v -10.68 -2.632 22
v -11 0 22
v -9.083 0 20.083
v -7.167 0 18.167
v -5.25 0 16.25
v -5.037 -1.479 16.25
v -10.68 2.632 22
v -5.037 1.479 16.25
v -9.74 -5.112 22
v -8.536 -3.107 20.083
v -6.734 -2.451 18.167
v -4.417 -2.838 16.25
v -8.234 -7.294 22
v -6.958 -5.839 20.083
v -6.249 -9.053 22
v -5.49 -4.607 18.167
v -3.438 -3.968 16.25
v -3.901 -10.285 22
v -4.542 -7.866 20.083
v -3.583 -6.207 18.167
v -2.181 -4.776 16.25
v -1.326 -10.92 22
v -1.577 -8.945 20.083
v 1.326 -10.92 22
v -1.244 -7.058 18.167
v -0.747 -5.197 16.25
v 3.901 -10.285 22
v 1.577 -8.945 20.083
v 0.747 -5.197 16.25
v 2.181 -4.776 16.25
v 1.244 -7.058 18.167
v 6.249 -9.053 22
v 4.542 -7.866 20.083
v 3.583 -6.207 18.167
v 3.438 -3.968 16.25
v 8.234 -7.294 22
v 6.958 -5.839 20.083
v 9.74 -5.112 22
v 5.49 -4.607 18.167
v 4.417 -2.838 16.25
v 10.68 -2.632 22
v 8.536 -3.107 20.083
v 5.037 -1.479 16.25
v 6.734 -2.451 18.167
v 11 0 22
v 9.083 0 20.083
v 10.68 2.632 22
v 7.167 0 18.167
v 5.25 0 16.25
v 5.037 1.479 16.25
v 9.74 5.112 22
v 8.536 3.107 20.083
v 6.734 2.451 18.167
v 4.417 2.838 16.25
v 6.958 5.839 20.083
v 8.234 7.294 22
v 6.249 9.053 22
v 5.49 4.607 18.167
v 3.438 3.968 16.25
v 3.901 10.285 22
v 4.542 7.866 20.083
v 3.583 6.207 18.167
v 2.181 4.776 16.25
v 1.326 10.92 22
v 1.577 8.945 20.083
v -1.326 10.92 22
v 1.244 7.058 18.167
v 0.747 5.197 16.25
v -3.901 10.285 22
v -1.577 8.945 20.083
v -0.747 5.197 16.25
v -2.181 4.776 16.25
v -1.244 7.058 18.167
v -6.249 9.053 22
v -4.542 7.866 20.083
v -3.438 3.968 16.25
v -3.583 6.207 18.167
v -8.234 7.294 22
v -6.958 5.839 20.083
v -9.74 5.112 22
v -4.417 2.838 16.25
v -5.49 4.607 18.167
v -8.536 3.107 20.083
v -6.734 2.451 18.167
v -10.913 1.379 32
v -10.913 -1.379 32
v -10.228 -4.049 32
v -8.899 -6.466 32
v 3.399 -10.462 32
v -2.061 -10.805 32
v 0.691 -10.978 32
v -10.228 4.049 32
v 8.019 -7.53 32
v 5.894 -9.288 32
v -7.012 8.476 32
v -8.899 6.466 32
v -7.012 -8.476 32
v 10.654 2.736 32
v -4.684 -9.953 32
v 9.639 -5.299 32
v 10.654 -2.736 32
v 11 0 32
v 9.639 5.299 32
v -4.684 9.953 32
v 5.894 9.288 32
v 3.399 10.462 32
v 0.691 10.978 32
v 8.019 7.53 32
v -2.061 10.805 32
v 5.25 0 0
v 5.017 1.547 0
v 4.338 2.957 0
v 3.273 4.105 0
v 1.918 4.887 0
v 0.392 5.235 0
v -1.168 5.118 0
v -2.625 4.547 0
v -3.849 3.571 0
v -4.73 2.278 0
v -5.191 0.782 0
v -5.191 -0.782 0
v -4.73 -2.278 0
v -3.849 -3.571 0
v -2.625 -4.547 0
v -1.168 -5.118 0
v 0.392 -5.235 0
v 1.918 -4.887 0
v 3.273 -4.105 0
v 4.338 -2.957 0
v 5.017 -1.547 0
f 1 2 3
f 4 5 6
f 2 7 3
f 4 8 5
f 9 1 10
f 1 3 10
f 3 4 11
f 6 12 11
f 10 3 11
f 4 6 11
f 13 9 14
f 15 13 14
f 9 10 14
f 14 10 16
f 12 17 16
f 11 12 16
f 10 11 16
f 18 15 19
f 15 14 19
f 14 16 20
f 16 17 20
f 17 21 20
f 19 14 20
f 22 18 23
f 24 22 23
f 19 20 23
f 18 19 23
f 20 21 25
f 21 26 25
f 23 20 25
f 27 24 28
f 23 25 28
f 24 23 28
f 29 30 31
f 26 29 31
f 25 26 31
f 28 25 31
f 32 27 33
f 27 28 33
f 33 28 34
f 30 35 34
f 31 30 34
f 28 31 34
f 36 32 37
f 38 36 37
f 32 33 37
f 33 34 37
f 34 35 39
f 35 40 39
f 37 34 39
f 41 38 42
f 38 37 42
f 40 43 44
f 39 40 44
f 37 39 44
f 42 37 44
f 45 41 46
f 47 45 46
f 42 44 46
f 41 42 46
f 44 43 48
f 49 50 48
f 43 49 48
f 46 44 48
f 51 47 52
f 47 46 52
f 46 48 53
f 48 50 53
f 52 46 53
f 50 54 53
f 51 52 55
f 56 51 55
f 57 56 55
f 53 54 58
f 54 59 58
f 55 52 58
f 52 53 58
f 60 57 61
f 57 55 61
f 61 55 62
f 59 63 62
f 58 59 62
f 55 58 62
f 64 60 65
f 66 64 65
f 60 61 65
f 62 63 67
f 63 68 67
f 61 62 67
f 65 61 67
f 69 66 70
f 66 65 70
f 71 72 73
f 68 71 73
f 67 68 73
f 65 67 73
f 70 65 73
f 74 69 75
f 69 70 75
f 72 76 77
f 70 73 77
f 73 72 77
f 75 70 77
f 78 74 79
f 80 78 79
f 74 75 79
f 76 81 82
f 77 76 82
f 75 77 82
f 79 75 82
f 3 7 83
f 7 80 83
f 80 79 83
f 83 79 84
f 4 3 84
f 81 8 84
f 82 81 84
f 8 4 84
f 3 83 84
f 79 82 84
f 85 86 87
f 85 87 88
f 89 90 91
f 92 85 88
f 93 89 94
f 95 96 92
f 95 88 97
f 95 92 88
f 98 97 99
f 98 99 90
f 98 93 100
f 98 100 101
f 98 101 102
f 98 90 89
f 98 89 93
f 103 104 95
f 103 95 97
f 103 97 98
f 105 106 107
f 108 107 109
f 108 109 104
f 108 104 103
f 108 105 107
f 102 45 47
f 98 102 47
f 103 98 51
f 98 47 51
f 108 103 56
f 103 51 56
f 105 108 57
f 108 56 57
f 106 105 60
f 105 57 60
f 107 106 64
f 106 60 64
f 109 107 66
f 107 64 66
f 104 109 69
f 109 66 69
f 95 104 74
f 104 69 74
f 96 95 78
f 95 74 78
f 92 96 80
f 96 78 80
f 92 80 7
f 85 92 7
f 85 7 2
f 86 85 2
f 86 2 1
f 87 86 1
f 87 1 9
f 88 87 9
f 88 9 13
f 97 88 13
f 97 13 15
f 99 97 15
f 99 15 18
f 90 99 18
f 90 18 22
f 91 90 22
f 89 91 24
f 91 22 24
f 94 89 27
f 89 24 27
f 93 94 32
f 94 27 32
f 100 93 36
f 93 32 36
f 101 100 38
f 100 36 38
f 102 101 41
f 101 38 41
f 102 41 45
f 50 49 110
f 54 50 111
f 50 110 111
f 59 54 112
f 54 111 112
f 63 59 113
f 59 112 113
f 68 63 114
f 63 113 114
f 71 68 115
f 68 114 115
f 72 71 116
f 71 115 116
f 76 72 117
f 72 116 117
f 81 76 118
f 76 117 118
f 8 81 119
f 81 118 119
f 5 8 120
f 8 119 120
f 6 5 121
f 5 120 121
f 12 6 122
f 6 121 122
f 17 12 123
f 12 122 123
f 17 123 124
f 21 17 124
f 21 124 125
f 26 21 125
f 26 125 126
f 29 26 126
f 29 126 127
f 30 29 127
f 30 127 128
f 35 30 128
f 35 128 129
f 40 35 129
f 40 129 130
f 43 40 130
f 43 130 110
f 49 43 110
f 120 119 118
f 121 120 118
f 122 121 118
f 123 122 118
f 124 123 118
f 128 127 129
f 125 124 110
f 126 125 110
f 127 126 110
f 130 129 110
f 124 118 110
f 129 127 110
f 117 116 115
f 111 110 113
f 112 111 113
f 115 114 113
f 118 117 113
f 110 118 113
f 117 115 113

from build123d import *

# Parameters (mm, degrees)
F2_R     = 5.25
F3_DEPTH = 22
F5_START = 22
F4_R     = 11
F5_DEPTH = 10


with BuildPart() as f3:
    # F2 (on Top) → F3 (new body)
    with BuildSketch(Plane.XY):
        Circle(F2_R)
    extrude(amount=F3_DEPTH)

    # F4 (on Top) → F5 (join)
    with BuildSketch(Plane.XY.offset(F5_START)):
        Circle(F4_R)
    extrude(amount=F5_DEPTH)

    # F6 (on Front) → F7 (revolve)
    with BuildSketch(Plane.XZ):
        Polygon((0, 11), (0, 22), (-11, 22), align=None)
    revolve(axis=Axis((0, 0, 16.5), (0, 0, 1)))


solid = f3.part
